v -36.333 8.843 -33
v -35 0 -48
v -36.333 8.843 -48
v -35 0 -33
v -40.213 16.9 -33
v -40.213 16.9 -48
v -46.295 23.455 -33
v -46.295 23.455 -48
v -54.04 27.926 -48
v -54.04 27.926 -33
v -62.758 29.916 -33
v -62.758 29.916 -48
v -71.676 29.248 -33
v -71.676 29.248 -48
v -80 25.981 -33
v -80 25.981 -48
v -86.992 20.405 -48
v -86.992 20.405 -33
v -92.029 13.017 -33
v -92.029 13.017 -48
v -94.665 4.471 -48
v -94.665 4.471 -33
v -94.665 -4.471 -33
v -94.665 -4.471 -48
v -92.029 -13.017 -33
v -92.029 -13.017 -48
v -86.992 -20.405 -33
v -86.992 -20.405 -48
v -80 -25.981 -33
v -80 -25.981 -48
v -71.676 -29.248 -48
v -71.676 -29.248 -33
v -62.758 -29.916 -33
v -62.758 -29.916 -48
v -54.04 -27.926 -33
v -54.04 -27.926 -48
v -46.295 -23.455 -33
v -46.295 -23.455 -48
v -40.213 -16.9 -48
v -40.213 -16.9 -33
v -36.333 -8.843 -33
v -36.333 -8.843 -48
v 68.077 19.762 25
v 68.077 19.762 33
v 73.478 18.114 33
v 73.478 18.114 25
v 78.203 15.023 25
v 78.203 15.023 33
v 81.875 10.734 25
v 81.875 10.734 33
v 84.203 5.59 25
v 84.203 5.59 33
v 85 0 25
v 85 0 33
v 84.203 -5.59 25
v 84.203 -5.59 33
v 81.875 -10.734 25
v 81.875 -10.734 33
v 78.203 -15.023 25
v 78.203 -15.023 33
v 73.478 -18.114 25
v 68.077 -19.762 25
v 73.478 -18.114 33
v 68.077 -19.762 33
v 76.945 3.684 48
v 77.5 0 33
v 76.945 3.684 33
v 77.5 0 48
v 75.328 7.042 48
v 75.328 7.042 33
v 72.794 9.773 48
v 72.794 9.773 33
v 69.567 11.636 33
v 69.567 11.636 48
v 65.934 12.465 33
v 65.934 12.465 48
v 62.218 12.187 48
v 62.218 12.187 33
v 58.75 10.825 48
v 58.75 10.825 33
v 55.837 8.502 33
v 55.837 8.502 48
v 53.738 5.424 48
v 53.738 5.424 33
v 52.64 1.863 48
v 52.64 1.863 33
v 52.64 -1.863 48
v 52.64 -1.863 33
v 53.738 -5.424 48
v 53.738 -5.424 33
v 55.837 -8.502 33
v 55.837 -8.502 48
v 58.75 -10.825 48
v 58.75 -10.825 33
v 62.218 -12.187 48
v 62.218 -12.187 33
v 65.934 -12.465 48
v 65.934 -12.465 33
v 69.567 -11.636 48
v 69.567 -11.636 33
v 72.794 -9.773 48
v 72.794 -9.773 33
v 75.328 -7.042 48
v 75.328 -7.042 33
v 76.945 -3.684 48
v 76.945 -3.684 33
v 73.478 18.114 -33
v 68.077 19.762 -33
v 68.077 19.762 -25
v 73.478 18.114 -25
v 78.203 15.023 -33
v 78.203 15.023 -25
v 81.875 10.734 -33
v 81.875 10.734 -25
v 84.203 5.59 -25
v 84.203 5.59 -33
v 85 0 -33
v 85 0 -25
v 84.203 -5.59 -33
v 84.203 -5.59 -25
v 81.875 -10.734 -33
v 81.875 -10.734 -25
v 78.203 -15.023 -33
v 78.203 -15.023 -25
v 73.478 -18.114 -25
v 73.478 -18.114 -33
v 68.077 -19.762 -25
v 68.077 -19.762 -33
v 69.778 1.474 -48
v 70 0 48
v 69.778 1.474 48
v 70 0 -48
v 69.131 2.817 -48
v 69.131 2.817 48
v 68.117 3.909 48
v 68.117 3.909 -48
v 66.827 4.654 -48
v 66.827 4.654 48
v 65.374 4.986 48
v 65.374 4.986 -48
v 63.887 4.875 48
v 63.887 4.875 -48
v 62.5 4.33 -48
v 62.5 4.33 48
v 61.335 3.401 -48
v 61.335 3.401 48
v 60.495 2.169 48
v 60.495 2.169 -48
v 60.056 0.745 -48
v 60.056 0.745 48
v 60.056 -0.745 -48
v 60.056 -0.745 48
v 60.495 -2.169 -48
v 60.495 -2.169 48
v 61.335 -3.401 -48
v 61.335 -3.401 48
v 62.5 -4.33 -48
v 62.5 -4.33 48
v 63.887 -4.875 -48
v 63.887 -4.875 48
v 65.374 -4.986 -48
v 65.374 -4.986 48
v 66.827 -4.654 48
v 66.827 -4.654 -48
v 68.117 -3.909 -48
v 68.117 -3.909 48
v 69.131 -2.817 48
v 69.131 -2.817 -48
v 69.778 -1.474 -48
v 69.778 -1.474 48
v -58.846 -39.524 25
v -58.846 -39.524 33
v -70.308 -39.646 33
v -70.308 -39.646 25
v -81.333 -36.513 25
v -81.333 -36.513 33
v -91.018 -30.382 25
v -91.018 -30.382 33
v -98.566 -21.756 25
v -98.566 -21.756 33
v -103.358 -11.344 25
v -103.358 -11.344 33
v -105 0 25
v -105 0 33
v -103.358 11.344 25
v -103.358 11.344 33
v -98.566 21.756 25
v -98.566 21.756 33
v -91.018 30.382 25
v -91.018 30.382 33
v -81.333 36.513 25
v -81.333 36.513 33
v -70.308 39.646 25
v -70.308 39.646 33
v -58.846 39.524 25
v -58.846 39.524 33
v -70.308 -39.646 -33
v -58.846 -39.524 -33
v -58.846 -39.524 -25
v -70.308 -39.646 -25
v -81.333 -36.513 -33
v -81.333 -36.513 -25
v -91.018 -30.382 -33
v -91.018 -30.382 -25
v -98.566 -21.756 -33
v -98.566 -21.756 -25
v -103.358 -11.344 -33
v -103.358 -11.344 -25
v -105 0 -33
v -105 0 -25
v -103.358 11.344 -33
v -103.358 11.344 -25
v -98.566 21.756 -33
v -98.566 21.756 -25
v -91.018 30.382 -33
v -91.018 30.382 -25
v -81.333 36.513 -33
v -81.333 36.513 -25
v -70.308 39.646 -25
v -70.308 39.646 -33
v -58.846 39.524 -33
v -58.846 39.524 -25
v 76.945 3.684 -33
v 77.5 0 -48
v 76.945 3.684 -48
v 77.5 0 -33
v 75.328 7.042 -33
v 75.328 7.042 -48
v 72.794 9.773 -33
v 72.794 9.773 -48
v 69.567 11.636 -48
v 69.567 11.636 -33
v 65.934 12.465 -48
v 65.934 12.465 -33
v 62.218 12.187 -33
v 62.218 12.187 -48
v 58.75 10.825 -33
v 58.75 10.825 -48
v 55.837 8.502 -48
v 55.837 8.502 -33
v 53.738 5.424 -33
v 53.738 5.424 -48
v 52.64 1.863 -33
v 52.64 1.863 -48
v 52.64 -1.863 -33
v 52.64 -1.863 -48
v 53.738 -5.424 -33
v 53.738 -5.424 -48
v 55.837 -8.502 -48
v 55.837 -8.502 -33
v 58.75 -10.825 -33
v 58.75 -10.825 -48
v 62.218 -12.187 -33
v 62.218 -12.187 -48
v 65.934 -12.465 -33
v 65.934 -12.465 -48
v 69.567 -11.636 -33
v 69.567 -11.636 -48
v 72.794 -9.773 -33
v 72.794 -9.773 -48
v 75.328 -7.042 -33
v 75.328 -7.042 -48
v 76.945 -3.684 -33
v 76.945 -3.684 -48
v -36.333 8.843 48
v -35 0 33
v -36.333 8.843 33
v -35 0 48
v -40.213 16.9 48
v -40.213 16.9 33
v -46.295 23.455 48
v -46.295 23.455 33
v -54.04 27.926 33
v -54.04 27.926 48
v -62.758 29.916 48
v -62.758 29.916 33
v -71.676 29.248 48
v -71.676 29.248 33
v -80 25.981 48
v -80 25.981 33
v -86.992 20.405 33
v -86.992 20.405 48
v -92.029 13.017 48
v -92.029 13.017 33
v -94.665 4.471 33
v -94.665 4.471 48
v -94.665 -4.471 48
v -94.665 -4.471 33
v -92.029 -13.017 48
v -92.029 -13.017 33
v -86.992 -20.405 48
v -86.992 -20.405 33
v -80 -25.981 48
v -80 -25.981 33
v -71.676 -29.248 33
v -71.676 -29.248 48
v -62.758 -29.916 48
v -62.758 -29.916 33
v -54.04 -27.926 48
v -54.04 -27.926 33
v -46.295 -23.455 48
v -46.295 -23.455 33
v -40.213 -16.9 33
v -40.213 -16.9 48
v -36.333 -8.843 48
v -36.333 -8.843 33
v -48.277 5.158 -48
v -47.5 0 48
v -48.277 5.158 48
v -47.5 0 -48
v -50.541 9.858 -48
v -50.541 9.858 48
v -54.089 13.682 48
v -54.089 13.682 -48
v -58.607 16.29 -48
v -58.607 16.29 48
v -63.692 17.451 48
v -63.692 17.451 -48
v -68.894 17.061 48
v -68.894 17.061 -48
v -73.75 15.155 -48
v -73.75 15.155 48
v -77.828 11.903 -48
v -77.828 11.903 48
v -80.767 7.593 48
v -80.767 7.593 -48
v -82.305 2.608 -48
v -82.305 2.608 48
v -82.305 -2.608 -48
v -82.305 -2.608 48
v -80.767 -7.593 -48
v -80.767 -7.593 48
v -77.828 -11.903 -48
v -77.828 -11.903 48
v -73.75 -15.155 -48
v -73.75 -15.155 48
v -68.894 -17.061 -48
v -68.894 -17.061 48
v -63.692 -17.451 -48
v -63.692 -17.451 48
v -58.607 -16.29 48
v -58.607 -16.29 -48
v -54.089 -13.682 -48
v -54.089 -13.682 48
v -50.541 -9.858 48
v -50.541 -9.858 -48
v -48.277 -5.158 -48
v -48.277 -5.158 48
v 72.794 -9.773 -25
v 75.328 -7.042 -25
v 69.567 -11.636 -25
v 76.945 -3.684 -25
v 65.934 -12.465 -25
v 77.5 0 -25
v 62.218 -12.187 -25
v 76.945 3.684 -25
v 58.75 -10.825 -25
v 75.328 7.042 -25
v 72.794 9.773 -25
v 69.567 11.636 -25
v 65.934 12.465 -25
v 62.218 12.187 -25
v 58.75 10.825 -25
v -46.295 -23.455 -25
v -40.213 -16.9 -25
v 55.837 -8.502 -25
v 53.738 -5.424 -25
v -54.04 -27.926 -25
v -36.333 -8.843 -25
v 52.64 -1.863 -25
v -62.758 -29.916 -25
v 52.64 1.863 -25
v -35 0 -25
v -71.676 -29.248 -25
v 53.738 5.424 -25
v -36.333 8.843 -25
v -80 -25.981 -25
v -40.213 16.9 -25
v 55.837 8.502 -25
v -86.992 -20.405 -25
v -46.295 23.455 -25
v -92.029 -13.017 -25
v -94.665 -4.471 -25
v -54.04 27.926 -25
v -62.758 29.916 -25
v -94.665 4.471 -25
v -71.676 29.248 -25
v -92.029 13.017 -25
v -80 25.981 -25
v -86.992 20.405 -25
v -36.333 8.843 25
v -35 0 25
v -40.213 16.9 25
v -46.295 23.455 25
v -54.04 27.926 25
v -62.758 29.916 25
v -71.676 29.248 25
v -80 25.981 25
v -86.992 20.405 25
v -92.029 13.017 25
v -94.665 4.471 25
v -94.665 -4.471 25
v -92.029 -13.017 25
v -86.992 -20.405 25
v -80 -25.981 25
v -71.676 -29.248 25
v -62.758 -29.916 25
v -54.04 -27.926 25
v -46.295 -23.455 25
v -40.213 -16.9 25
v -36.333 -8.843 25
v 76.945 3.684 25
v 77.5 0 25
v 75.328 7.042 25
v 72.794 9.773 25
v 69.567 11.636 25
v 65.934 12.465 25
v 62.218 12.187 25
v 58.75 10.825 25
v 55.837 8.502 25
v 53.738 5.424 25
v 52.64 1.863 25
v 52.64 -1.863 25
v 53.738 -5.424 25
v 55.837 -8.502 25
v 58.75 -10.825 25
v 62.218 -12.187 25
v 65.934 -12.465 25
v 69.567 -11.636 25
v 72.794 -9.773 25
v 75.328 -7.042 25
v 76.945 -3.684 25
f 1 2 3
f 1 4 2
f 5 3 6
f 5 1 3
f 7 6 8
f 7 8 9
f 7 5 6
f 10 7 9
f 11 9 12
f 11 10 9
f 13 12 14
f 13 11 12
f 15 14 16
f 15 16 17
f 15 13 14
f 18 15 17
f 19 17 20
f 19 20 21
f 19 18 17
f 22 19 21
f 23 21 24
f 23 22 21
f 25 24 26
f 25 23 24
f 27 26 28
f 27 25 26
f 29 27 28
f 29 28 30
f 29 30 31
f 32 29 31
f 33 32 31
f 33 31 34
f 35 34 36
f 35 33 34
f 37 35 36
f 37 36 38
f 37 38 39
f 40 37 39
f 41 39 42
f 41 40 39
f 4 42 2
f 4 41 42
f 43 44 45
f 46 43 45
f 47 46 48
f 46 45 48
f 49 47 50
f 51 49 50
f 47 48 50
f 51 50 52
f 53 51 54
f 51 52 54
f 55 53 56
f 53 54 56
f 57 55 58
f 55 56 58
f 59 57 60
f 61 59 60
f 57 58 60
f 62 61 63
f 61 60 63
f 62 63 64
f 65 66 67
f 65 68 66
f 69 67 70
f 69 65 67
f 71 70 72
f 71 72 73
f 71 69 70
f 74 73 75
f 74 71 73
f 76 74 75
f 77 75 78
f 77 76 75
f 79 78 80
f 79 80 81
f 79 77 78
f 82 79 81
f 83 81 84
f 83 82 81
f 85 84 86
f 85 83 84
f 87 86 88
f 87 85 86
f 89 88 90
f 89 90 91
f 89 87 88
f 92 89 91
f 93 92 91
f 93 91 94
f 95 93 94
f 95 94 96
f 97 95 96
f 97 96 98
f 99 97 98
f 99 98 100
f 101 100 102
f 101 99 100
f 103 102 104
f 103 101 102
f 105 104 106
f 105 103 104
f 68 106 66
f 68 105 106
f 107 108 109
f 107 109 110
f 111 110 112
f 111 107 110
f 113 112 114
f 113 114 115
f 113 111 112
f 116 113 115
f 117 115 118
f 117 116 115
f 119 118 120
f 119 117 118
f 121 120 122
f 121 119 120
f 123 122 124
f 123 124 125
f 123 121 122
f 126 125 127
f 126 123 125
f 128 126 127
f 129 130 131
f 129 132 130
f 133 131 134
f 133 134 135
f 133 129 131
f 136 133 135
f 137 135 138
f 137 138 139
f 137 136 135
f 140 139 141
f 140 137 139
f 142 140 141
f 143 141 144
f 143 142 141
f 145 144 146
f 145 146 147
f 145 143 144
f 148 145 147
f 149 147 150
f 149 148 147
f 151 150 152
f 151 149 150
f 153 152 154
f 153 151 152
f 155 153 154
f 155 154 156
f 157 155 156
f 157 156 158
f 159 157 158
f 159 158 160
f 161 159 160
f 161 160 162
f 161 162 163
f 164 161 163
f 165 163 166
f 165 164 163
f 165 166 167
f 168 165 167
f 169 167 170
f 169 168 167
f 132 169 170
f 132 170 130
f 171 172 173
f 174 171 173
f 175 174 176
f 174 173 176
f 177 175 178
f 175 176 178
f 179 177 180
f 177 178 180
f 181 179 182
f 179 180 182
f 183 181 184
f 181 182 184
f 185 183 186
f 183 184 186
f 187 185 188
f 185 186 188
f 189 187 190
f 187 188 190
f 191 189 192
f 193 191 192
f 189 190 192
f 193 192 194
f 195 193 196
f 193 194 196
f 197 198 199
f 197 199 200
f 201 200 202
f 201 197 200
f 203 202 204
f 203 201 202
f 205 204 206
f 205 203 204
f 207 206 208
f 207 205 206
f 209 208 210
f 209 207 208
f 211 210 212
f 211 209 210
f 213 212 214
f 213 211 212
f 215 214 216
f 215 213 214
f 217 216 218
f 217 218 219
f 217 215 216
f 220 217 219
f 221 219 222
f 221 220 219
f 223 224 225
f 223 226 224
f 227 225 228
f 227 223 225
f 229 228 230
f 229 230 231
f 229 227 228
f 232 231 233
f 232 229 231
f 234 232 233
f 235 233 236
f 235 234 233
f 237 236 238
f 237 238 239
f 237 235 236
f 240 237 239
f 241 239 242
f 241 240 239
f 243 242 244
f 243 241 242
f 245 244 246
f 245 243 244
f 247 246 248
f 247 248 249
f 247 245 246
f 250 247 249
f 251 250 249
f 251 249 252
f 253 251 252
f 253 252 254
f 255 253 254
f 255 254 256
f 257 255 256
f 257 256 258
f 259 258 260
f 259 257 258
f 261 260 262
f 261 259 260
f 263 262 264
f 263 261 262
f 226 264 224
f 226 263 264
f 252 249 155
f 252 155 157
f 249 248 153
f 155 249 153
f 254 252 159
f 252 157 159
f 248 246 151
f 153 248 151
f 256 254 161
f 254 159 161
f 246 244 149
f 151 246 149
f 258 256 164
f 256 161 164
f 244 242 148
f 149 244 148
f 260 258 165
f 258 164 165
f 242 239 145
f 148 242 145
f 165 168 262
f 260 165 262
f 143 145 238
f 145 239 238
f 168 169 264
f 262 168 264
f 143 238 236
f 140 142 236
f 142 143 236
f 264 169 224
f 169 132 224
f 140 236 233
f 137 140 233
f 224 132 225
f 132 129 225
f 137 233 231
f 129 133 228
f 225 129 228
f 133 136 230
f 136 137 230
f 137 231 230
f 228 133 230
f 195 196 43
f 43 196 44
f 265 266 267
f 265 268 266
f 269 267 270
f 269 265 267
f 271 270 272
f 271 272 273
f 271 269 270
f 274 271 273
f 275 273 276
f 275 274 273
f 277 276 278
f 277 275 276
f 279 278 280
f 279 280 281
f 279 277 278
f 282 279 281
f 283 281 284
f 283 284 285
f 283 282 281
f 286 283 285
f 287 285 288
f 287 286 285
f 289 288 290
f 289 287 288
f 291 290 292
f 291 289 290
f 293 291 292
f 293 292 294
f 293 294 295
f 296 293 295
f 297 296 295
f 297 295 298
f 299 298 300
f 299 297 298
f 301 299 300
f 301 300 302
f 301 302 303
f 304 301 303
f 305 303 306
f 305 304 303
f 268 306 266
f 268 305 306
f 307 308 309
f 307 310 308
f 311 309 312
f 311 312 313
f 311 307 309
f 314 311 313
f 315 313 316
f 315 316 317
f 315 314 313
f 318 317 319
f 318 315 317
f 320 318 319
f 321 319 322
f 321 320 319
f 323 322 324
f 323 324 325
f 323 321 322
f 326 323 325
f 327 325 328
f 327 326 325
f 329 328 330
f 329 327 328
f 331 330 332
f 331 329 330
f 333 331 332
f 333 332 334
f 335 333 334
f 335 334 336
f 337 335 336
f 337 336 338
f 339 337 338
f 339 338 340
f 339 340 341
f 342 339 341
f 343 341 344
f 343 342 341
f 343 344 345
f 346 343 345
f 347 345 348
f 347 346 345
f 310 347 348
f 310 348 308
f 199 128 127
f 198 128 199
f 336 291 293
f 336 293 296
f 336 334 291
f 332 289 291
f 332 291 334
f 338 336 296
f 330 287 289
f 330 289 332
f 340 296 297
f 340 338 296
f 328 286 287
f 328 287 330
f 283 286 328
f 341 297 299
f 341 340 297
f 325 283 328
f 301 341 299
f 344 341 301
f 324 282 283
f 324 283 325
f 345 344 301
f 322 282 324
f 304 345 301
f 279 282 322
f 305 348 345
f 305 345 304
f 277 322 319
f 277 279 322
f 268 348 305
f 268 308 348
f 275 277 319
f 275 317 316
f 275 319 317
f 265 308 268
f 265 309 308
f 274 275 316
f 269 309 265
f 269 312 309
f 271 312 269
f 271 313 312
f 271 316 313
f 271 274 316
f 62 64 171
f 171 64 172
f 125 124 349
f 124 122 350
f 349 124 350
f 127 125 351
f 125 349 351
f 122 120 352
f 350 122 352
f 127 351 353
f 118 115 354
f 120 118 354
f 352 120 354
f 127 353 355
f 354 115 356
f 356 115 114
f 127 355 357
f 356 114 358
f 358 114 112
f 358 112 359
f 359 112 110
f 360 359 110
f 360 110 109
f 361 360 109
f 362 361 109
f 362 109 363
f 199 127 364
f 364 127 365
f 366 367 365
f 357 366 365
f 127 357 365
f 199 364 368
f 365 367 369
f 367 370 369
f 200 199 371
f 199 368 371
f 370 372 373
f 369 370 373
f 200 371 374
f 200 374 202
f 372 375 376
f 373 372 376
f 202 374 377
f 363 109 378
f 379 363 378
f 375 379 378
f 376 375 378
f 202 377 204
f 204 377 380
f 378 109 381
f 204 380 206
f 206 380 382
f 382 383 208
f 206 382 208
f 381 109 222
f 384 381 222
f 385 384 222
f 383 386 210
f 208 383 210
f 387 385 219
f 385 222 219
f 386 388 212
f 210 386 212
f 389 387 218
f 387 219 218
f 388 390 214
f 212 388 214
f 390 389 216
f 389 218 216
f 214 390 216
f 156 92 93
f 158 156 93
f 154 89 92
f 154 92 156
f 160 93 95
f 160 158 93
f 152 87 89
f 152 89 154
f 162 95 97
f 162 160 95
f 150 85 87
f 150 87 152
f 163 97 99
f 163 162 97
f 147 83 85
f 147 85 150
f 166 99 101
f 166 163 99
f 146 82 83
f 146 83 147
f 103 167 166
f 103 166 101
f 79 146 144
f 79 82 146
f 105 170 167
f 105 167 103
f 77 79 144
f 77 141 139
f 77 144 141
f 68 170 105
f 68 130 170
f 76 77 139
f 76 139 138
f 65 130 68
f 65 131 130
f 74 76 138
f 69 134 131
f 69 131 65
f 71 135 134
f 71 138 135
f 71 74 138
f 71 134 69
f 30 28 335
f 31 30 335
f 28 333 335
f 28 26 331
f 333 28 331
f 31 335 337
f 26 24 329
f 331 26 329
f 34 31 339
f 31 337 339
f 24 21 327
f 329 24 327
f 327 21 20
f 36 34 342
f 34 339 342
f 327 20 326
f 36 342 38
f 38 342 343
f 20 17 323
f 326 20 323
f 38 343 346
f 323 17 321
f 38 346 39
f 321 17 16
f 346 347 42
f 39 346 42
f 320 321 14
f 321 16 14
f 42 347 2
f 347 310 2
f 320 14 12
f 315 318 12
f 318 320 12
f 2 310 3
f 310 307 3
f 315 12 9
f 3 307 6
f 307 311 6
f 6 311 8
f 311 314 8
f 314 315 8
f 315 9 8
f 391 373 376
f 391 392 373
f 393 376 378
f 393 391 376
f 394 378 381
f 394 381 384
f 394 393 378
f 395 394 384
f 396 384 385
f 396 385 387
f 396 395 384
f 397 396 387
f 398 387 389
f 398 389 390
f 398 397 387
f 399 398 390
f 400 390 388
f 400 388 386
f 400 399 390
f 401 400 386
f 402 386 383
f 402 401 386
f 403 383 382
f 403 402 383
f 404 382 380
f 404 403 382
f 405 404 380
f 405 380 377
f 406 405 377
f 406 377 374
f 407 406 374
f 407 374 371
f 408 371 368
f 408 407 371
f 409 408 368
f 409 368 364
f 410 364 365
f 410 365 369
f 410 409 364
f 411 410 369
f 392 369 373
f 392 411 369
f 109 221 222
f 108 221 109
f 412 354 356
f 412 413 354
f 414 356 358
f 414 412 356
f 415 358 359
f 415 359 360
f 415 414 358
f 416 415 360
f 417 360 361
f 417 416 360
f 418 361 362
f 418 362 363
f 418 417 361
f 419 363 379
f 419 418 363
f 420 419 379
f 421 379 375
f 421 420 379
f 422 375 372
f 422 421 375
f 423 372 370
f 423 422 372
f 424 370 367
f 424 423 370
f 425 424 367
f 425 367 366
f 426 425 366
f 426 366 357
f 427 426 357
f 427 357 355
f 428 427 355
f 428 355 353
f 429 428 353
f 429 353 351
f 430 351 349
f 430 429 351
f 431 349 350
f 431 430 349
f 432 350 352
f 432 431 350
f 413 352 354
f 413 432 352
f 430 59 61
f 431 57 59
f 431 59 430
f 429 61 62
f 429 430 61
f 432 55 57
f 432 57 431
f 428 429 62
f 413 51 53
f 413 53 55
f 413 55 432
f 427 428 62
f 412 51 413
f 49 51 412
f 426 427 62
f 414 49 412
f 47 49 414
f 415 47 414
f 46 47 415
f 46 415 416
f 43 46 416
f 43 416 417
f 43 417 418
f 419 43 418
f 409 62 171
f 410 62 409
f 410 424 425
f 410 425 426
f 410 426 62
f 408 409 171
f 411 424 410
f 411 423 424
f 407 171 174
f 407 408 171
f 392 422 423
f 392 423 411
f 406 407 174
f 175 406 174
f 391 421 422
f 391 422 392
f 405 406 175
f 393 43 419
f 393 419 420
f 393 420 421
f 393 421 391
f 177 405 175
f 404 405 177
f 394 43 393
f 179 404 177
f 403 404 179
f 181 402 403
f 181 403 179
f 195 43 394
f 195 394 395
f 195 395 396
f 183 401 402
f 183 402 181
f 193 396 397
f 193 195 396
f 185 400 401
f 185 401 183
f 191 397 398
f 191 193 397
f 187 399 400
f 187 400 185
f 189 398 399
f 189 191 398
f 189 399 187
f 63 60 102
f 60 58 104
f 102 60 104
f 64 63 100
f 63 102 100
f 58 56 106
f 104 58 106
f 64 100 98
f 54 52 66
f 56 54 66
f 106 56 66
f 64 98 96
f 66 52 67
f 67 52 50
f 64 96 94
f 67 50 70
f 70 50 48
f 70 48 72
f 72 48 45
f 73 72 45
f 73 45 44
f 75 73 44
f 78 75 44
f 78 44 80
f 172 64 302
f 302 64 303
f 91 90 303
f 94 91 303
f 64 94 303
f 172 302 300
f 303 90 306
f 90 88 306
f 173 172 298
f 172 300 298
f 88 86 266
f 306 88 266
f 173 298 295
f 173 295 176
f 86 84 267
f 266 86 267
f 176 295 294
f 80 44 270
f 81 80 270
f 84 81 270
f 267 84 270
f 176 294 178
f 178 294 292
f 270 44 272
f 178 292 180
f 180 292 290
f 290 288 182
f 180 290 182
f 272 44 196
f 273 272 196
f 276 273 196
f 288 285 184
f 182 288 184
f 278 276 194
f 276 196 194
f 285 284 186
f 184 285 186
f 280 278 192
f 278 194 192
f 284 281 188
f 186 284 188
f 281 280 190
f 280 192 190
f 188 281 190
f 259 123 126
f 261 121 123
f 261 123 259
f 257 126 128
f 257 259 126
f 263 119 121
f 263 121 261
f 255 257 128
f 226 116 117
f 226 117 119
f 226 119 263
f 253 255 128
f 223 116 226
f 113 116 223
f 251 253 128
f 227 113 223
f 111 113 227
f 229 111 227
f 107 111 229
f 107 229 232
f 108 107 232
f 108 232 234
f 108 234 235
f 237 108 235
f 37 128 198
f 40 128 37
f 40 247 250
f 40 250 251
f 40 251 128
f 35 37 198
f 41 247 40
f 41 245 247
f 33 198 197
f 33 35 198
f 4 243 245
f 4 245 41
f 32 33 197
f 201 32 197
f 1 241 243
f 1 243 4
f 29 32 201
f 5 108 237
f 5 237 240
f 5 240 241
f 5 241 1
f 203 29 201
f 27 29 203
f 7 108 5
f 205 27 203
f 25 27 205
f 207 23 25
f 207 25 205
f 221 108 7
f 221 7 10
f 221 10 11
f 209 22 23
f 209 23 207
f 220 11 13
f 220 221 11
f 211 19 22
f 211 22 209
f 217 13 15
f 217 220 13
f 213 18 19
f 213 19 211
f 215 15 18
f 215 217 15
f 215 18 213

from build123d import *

# Parameters (mm, degrees)
SKETCH1_R             = 30
SKETCH1_R_2           = 17.5
BOSS_EXTRUDE1_DEPTH   = 48
SKETCH1_R_3           = 12.5
SKETCH1_R_4           = 5
BOSS_EXTRUDE1_2_DEPTH = 48
SKETCH2_R             = 30
SKETCH2_R_2           = 12.5
BOSS_EXTRUDE2_DEPTH   = 8


with BuildPart() as part:
    # Sketch1 → Boss-Extrude1 (new, symmetric)
    with BuildSketch(Plane.XY):
        with Locations((-65, 0)):
            Circle(SKETCH1_R)
        with Locations((-65, 0)):
            Circle(SKETCH1_R_2, mode=Mode.SUBTRACT)
    extrude(amount=BOSS_EXTRUDE1_DEPTH, both=True)



with BuildPart() as body_2:
    # Sketch1 → Boss-Extrude1 2 (new, symmetric)
    with BuildSketch(Plane.XY):
        with Locations((65, 0)):
            Circle(SKETCH1_R_3)
        with Locations((65, 0)):
            Circle(SKETCH1_R_4, mode=Mode.SUBTRACT)
    extrude(amount=BOSS_EXTRUDE1_2_DEPTH, both=True)


with BuildPart() as part_1:
    add(part.part)

    add(body_2.part)  # Boss-Extrude2 merges body 2
    # Sketch2 → Boss-Extrude2 (add)
    with BuildSketch(Plane.XY.offset(33)):
        with BuildLine():
            Line((68.076923077, -19.761896275), (-58.846153846, -39.52379255))
            ThreePointArc((-58.846153846, -39.52379255), (-105, 0), (-58.846153846, 39.52379255))
            Line((-58.846153846, 39.52379255), (68.076923077, 19.761896275))
            ThreePointArc((68.076923077, 19.761896275), (85, 0), (68.076923077, -19.761896275))
        make_face()
        with Locations((-65, 0)):
            Circle(SKETCH2_R, mode=Mode.SUBTRACT)
        with Locations((65, 0)):
            Circle(SKETCH2_R_2, mode=Mode.SUBTRACT)
    boss_extrude2 = extrude(amount=-BOSS_EXTRUDE2_DEPTH)

    # Mirror1: Boss-Extrude2 across plane
    add(boss_extrude2.mirror(Plane.XY))


solid = part_1.part
